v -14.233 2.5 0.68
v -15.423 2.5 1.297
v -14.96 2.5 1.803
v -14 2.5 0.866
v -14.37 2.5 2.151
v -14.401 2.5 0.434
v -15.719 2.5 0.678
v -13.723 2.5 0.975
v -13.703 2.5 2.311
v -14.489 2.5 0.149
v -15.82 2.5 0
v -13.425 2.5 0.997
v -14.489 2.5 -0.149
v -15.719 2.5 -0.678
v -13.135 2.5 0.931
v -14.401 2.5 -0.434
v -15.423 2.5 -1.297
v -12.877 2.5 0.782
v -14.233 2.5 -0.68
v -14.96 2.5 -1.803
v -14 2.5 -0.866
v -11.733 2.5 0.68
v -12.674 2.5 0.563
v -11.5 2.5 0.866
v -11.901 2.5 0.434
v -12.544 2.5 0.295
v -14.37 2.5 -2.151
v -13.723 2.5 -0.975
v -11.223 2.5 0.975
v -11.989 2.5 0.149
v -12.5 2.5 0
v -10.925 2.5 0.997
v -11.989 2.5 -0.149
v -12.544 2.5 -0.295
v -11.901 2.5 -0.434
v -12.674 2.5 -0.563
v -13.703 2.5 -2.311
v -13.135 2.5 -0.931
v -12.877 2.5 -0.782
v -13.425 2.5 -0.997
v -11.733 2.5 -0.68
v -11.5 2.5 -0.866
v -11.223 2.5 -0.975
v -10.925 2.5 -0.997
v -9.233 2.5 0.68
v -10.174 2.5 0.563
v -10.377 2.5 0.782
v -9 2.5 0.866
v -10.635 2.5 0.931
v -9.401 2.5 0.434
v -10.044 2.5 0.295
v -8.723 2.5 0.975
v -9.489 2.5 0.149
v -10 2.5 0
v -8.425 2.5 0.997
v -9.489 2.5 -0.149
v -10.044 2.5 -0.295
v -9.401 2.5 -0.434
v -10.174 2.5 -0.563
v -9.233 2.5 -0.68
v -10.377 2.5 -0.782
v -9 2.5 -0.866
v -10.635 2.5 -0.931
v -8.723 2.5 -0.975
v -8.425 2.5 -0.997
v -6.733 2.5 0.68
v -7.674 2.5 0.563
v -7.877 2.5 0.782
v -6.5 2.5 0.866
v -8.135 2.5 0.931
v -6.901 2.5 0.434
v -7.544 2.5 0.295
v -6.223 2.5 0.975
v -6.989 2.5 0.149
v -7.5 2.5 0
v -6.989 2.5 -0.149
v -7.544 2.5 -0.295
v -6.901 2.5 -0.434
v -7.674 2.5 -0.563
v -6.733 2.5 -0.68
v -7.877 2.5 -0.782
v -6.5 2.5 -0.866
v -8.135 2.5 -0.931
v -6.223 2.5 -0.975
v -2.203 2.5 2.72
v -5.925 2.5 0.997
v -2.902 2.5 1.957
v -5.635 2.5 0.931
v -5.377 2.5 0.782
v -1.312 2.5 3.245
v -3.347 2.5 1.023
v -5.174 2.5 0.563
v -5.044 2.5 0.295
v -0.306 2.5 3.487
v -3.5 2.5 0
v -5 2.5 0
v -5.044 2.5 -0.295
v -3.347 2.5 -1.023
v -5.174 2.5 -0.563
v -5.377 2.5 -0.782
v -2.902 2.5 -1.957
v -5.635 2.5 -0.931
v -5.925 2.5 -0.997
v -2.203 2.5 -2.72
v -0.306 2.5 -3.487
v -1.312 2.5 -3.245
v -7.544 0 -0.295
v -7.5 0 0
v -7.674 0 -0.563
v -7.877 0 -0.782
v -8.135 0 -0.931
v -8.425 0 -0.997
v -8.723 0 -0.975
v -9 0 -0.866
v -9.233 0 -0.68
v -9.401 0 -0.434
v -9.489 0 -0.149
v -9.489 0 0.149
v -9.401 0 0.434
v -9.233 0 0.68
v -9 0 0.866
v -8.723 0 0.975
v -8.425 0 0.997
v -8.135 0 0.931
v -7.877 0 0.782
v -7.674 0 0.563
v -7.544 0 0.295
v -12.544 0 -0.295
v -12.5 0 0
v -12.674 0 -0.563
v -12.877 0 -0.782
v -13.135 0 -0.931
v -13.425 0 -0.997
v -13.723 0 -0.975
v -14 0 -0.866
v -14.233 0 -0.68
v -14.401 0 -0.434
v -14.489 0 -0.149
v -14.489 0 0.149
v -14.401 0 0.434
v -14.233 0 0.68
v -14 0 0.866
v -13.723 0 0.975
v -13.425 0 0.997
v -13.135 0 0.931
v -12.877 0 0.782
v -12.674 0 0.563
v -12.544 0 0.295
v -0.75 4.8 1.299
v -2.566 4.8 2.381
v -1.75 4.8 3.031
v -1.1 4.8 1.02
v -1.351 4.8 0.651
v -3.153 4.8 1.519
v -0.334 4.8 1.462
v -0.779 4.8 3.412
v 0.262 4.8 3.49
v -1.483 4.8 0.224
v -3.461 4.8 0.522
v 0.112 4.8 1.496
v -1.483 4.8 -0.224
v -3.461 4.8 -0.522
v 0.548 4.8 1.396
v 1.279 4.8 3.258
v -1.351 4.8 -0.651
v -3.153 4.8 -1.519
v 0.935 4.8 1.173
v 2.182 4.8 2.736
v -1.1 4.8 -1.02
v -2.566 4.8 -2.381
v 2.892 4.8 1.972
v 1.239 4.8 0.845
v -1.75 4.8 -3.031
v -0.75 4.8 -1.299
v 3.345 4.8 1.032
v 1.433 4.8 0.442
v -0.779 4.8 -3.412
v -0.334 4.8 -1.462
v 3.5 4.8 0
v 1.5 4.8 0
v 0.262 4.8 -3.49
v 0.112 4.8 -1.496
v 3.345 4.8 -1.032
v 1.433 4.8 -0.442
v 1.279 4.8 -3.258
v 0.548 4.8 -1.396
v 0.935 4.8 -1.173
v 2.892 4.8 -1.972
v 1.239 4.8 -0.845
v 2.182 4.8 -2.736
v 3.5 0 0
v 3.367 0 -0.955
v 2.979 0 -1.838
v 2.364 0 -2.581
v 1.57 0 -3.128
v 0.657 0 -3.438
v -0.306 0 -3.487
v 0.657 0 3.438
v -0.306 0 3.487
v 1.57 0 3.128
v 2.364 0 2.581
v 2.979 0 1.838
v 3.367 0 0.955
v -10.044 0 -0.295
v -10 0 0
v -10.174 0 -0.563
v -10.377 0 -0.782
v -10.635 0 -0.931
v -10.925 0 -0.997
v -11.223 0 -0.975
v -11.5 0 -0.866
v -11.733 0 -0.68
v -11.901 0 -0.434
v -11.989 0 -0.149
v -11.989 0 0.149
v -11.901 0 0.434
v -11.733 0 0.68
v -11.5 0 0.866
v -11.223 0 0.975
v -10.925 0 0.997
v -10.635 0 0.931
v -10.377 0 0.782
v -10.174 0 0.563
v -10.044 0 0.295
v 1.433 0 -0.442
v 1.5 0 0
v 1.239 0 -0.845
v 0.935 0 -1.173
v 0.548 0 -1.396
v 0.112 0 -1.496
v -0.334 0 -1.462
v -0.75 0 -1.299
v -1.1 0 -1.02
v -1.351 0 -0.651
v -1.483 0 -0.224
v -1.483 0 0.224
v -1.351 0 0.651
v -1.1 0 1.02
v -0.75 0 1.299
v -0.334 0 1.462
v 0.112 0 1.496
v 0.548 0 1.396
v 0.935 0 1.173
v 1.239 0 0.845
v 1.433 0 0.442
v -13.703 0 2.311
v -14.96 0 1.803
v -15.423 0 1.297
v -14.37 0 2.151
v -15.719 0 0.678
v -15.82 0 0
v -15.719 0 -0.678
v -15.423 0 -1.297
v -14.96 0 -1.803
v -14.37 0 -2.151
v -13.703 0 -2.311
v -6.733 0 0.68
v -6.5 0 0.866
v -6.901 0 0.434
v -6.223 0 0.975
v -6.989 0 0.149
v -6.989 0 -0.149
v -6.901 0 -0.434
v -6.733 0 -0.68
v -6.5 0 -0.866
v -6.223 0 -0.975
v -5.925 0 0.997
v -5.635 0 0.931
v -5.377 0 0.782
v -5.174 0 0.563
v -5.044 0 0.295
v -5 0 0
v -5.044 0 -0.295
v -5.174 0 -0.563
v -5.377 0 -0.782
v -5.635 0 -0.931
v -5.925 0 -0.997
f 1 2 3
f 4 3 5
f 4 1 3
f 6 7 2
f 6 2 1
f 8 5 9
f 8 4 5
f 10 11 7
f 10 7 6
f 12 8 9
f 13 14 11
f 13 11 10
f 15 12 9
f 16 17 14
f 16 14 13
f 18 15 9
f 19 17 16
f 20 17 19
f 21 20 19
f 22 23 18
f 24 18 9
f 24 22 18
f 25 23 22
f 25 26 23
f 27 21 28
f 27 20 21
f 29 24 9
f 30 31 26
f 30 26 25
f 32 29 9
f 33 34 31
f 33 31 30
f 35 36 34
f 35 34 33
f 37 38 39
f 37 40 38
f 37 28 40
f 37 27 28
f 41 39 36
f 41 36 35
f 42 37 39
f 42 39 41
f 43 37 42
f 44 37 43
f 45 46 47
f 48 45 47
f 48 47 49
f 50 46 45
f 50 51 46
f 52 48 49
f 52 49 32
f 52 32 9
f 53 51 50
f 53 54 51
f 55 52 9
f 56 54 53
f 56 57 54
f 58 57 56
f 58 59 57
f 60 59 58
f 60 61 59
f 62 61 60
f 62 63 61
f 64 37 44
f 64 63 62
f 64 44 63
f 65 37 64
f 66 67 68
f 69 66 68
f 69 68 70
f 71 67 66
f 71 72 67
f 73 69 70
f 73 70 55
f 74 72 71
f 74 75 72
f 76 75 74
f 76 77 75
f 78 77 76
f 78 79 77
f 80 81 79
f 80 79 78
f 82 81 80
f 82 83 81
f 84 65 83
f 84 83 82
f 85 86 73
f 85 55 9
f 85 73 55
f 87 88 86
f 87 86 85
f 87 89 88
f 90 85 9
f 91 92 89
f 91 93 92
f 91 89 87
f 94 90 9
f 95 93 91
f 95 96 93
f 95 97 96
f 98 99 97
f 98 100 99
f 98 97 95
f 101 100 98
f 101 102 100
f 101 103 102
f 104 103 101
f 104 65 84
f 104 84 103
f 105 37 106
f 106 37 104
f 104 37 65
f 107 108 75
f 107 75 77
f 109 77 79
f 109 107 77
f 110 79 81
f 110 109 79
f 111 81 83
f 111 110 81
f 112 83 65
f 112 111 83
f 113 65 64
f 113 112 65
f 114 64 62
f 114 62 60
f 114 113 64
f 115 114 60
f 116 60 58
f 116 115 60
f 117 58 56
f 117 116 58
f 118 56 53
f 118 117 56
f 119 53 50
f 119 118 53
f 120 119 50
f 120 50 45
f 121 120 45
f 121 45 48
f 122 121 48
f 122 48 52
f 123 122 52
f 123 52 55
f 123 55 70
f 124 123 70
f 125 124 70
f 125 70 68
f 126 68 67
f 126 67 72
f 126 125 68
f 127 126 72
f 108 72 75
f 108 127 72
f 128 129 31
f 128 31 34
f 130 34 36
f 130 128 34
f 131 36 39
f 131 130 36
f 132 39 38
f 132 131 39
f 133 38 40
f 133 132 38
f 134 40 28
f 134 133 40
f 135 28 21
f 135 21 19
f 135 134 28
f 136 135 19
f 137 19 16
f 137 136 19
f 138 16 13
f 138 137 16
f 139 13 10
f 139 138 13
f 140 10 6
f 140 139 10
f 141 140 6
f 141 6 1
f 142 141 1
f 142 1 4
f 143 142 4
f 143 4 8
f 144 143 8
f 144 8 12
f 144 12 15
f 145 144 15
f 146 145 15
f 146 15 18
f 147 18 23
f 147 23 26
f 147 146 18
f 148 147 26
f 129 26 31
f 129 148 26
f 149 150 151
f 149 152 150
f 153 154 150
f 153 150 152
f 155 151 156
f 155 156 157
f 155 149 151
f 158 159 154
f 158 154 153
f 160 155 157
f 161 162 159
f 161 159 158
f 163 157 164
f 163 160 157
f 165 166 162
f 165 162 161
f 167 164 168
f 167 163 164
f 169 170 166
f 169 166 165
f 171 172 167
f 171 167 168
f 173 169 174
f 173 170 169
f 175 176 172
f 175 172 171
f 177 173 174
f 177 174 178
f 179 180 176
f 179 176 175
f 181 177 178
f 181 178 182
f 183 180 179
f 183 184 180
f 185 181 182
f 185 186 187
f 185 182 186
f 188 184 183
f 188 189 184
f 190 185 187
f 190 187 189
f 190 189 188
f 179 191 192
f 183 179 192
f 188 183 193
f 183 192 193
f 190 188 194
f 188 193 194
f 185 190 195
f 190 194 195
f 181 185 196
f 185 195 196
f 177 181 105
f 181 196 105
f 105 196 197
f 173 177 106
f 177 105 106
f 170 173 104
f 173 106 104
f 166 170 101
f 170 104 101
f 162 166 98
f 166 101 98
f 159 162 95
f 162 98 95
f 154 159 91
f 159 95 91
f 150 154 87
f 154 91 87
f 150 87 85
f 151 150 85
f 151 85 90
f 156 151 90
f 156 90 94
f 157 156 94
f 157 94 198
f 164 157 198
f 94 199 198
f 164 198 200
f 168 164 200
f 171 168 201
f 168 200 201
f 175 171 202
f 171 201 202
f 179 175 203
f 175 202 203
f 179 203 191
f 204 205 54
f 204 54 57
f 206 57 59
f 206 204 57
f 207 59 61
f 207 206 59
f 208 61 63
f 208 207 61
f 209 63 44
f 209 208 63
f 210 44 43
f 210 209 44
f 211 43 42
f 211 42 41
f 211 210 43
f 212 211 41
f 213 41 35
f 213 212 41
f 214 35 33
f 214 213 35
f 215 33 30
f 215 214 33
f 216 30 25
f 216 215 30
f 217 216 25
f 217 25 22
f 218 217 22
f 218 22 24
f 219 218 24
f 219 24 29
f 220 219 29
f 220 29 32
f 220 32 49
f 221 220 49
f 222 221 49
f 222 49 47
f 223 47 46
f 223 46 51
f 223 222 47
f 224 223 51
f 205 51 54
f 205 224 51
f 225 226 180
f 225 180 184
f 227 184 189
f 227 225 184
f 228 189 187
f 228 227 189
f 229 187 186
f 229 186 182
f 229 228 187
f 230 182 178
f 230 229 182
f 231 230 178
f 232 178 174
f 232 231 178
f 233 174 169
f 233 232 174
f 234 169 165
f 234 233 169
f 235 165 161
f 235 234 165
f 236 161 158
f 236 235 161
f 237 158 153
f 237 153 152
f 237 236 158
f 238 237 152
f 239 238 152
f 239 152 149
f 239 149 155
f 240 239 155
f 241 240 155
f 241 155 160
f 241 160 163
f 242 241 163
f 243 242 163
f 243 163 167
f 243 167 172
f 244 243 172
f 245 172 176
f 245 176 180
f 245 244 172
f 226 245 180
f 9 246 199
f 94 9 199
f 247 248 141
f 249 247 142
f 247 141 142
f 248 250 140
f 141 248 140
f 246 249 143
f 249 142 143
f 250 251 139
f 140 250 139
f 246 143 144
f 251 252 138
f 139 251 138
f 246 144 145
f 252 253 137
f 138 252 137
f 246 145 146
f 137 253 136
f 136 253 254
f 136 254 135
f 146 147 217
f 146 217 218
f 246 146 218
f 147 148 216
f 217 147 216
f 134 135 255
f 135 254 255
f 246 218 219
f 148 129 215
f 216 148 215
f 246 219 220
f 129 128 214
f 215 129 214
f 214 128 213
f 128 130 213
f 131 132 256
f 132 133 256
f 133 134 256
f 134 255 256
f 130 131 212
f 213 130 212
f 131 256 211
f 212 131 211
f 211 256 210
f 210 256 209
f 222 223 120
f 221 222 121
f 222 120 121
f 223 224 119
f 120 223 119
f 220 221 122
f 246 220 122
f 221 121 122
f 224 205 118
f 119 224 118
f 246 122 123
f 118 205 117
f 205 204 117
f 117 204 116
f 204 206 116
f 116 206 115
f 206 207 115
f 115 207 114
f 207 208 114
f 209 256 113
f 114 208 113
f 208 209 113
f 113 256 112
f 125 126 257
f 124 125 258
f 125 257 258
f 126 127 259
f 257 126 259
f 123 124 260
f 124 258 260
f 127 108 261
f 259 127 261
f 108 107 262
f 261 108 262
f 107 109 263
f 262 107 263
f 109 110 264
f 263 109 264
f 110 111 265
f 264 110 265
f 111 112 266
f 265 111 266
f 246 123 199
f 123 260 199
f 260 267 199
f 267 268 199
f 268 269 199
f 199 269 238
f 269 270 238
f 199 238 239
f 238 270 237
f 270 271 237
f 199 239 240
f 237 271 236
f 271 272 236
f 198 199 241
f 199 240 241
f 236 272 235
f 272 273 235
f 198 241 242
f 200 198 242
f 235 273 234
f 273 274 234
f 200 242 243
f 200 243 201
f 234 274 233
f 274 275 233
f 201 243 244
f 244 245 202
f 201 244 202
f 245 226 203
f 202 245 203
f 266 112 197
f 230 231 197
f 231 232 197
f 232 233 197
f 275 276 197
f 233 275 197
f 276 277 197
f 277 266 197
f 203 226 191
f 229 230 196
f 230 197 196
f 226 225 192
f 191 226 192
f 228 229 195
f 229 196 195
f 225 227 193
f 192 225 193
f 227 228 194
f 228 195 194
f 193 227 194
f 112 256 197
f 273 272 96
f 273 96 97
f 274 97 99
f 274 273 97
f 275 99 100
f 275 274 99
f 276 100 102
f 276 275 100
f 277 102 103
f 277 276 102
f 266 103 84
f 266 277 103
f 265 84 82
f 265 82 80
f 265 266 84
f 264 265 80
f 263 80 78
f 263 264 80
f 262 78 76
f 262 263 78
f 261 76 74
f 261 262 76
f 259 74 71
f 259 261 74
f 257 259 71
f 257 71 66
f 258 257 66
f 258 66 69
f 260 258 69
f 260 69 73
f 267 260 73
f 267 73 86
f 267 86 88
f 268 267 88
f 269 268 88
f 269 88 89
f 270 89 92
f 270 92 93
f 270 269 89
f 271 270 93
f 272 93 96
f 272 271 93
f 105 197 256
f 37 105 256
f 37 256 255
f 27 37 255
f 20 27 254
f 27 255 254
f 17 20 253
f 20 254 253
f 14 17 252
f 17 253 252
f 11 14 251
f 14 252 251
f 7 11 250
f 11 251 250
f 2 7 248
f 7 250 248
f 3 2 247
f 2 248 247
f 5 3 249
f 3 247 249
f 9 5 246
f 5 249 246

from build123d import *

# Parameters (mm, degrees)
SKETCH_1_R      = 1
EXTRUDE_1_DEPTH = 2.5
SKETCH_1_3_R    = 1.5
EXTRUDE_2_DEPTH = 4.8


with BuildPart() as part:
    # 草图1 → 凸台-拉伸1 (new body)
    with BuildSketch(Plane(origin=(0, 0, 0), x_dir=(1, 0, 0), z_dir=(0, 1, 0))):
        with BuildLine():
            ThreePointArc((-0.305925926, -3.486604269), (-3.5, 0), (-0.305925926, 3.486604269))
            Line((-0.305925926, 3.486604269), (-13.702785185, 2.311120544))
            ThreePointArc((-13.702785185, 2.311120544), (-15.82, 0), (-13.702785185, -2.311120544))
            Line((-13.702785185, -2.311120544), (-0.305925926, -3.486604269))
        make_face()
        with Locations((-13.5, 0)):
            Circle(SKETCH_1_R, mode=Mode.SUBTRACT)
        with Locations((-11, 0)):
            Circle(SKETCH_1_R, mode=Mode.SUBTRACT)
        with Locations((-8.5, 0)):
            Circle(SKETCH_1_R, mode=Mode.SUBTRACT)
        with Locations((-6, 0)):
            Circle(SKETCH_1_R, mode=Mode.SUBTRACT)
    extrude(amount=EXTRUDE_1_DEPTH)

    # 草图1<3> → 凸台-拉伸2 (add)
    with BuildSketch(Plane(origin=(0, 0, 0), x_dir=(1, 0, 0), z_dir=(0, 1, 0))):
        with BuildLine():
            ThreePointArc((3.5, 0), (2.364239757, 2.580769337), (-0.305925926, 3.486604269))
            ThreePointArc((-0.305925926, 3.486604269), (-3.5, 0), (-0.305925926, -3.486604269))
            ThreePointArc((-0.305925926, -3.486604269), (2.364239757, -2.580769337), (3.5, 0))
        make_face()
        Circle(SKETCH_1_3_R, mode=Mode.SUBTRACT)
    extrude(amount=EXTRUDE_2_DEPTH)


solid = part.part
